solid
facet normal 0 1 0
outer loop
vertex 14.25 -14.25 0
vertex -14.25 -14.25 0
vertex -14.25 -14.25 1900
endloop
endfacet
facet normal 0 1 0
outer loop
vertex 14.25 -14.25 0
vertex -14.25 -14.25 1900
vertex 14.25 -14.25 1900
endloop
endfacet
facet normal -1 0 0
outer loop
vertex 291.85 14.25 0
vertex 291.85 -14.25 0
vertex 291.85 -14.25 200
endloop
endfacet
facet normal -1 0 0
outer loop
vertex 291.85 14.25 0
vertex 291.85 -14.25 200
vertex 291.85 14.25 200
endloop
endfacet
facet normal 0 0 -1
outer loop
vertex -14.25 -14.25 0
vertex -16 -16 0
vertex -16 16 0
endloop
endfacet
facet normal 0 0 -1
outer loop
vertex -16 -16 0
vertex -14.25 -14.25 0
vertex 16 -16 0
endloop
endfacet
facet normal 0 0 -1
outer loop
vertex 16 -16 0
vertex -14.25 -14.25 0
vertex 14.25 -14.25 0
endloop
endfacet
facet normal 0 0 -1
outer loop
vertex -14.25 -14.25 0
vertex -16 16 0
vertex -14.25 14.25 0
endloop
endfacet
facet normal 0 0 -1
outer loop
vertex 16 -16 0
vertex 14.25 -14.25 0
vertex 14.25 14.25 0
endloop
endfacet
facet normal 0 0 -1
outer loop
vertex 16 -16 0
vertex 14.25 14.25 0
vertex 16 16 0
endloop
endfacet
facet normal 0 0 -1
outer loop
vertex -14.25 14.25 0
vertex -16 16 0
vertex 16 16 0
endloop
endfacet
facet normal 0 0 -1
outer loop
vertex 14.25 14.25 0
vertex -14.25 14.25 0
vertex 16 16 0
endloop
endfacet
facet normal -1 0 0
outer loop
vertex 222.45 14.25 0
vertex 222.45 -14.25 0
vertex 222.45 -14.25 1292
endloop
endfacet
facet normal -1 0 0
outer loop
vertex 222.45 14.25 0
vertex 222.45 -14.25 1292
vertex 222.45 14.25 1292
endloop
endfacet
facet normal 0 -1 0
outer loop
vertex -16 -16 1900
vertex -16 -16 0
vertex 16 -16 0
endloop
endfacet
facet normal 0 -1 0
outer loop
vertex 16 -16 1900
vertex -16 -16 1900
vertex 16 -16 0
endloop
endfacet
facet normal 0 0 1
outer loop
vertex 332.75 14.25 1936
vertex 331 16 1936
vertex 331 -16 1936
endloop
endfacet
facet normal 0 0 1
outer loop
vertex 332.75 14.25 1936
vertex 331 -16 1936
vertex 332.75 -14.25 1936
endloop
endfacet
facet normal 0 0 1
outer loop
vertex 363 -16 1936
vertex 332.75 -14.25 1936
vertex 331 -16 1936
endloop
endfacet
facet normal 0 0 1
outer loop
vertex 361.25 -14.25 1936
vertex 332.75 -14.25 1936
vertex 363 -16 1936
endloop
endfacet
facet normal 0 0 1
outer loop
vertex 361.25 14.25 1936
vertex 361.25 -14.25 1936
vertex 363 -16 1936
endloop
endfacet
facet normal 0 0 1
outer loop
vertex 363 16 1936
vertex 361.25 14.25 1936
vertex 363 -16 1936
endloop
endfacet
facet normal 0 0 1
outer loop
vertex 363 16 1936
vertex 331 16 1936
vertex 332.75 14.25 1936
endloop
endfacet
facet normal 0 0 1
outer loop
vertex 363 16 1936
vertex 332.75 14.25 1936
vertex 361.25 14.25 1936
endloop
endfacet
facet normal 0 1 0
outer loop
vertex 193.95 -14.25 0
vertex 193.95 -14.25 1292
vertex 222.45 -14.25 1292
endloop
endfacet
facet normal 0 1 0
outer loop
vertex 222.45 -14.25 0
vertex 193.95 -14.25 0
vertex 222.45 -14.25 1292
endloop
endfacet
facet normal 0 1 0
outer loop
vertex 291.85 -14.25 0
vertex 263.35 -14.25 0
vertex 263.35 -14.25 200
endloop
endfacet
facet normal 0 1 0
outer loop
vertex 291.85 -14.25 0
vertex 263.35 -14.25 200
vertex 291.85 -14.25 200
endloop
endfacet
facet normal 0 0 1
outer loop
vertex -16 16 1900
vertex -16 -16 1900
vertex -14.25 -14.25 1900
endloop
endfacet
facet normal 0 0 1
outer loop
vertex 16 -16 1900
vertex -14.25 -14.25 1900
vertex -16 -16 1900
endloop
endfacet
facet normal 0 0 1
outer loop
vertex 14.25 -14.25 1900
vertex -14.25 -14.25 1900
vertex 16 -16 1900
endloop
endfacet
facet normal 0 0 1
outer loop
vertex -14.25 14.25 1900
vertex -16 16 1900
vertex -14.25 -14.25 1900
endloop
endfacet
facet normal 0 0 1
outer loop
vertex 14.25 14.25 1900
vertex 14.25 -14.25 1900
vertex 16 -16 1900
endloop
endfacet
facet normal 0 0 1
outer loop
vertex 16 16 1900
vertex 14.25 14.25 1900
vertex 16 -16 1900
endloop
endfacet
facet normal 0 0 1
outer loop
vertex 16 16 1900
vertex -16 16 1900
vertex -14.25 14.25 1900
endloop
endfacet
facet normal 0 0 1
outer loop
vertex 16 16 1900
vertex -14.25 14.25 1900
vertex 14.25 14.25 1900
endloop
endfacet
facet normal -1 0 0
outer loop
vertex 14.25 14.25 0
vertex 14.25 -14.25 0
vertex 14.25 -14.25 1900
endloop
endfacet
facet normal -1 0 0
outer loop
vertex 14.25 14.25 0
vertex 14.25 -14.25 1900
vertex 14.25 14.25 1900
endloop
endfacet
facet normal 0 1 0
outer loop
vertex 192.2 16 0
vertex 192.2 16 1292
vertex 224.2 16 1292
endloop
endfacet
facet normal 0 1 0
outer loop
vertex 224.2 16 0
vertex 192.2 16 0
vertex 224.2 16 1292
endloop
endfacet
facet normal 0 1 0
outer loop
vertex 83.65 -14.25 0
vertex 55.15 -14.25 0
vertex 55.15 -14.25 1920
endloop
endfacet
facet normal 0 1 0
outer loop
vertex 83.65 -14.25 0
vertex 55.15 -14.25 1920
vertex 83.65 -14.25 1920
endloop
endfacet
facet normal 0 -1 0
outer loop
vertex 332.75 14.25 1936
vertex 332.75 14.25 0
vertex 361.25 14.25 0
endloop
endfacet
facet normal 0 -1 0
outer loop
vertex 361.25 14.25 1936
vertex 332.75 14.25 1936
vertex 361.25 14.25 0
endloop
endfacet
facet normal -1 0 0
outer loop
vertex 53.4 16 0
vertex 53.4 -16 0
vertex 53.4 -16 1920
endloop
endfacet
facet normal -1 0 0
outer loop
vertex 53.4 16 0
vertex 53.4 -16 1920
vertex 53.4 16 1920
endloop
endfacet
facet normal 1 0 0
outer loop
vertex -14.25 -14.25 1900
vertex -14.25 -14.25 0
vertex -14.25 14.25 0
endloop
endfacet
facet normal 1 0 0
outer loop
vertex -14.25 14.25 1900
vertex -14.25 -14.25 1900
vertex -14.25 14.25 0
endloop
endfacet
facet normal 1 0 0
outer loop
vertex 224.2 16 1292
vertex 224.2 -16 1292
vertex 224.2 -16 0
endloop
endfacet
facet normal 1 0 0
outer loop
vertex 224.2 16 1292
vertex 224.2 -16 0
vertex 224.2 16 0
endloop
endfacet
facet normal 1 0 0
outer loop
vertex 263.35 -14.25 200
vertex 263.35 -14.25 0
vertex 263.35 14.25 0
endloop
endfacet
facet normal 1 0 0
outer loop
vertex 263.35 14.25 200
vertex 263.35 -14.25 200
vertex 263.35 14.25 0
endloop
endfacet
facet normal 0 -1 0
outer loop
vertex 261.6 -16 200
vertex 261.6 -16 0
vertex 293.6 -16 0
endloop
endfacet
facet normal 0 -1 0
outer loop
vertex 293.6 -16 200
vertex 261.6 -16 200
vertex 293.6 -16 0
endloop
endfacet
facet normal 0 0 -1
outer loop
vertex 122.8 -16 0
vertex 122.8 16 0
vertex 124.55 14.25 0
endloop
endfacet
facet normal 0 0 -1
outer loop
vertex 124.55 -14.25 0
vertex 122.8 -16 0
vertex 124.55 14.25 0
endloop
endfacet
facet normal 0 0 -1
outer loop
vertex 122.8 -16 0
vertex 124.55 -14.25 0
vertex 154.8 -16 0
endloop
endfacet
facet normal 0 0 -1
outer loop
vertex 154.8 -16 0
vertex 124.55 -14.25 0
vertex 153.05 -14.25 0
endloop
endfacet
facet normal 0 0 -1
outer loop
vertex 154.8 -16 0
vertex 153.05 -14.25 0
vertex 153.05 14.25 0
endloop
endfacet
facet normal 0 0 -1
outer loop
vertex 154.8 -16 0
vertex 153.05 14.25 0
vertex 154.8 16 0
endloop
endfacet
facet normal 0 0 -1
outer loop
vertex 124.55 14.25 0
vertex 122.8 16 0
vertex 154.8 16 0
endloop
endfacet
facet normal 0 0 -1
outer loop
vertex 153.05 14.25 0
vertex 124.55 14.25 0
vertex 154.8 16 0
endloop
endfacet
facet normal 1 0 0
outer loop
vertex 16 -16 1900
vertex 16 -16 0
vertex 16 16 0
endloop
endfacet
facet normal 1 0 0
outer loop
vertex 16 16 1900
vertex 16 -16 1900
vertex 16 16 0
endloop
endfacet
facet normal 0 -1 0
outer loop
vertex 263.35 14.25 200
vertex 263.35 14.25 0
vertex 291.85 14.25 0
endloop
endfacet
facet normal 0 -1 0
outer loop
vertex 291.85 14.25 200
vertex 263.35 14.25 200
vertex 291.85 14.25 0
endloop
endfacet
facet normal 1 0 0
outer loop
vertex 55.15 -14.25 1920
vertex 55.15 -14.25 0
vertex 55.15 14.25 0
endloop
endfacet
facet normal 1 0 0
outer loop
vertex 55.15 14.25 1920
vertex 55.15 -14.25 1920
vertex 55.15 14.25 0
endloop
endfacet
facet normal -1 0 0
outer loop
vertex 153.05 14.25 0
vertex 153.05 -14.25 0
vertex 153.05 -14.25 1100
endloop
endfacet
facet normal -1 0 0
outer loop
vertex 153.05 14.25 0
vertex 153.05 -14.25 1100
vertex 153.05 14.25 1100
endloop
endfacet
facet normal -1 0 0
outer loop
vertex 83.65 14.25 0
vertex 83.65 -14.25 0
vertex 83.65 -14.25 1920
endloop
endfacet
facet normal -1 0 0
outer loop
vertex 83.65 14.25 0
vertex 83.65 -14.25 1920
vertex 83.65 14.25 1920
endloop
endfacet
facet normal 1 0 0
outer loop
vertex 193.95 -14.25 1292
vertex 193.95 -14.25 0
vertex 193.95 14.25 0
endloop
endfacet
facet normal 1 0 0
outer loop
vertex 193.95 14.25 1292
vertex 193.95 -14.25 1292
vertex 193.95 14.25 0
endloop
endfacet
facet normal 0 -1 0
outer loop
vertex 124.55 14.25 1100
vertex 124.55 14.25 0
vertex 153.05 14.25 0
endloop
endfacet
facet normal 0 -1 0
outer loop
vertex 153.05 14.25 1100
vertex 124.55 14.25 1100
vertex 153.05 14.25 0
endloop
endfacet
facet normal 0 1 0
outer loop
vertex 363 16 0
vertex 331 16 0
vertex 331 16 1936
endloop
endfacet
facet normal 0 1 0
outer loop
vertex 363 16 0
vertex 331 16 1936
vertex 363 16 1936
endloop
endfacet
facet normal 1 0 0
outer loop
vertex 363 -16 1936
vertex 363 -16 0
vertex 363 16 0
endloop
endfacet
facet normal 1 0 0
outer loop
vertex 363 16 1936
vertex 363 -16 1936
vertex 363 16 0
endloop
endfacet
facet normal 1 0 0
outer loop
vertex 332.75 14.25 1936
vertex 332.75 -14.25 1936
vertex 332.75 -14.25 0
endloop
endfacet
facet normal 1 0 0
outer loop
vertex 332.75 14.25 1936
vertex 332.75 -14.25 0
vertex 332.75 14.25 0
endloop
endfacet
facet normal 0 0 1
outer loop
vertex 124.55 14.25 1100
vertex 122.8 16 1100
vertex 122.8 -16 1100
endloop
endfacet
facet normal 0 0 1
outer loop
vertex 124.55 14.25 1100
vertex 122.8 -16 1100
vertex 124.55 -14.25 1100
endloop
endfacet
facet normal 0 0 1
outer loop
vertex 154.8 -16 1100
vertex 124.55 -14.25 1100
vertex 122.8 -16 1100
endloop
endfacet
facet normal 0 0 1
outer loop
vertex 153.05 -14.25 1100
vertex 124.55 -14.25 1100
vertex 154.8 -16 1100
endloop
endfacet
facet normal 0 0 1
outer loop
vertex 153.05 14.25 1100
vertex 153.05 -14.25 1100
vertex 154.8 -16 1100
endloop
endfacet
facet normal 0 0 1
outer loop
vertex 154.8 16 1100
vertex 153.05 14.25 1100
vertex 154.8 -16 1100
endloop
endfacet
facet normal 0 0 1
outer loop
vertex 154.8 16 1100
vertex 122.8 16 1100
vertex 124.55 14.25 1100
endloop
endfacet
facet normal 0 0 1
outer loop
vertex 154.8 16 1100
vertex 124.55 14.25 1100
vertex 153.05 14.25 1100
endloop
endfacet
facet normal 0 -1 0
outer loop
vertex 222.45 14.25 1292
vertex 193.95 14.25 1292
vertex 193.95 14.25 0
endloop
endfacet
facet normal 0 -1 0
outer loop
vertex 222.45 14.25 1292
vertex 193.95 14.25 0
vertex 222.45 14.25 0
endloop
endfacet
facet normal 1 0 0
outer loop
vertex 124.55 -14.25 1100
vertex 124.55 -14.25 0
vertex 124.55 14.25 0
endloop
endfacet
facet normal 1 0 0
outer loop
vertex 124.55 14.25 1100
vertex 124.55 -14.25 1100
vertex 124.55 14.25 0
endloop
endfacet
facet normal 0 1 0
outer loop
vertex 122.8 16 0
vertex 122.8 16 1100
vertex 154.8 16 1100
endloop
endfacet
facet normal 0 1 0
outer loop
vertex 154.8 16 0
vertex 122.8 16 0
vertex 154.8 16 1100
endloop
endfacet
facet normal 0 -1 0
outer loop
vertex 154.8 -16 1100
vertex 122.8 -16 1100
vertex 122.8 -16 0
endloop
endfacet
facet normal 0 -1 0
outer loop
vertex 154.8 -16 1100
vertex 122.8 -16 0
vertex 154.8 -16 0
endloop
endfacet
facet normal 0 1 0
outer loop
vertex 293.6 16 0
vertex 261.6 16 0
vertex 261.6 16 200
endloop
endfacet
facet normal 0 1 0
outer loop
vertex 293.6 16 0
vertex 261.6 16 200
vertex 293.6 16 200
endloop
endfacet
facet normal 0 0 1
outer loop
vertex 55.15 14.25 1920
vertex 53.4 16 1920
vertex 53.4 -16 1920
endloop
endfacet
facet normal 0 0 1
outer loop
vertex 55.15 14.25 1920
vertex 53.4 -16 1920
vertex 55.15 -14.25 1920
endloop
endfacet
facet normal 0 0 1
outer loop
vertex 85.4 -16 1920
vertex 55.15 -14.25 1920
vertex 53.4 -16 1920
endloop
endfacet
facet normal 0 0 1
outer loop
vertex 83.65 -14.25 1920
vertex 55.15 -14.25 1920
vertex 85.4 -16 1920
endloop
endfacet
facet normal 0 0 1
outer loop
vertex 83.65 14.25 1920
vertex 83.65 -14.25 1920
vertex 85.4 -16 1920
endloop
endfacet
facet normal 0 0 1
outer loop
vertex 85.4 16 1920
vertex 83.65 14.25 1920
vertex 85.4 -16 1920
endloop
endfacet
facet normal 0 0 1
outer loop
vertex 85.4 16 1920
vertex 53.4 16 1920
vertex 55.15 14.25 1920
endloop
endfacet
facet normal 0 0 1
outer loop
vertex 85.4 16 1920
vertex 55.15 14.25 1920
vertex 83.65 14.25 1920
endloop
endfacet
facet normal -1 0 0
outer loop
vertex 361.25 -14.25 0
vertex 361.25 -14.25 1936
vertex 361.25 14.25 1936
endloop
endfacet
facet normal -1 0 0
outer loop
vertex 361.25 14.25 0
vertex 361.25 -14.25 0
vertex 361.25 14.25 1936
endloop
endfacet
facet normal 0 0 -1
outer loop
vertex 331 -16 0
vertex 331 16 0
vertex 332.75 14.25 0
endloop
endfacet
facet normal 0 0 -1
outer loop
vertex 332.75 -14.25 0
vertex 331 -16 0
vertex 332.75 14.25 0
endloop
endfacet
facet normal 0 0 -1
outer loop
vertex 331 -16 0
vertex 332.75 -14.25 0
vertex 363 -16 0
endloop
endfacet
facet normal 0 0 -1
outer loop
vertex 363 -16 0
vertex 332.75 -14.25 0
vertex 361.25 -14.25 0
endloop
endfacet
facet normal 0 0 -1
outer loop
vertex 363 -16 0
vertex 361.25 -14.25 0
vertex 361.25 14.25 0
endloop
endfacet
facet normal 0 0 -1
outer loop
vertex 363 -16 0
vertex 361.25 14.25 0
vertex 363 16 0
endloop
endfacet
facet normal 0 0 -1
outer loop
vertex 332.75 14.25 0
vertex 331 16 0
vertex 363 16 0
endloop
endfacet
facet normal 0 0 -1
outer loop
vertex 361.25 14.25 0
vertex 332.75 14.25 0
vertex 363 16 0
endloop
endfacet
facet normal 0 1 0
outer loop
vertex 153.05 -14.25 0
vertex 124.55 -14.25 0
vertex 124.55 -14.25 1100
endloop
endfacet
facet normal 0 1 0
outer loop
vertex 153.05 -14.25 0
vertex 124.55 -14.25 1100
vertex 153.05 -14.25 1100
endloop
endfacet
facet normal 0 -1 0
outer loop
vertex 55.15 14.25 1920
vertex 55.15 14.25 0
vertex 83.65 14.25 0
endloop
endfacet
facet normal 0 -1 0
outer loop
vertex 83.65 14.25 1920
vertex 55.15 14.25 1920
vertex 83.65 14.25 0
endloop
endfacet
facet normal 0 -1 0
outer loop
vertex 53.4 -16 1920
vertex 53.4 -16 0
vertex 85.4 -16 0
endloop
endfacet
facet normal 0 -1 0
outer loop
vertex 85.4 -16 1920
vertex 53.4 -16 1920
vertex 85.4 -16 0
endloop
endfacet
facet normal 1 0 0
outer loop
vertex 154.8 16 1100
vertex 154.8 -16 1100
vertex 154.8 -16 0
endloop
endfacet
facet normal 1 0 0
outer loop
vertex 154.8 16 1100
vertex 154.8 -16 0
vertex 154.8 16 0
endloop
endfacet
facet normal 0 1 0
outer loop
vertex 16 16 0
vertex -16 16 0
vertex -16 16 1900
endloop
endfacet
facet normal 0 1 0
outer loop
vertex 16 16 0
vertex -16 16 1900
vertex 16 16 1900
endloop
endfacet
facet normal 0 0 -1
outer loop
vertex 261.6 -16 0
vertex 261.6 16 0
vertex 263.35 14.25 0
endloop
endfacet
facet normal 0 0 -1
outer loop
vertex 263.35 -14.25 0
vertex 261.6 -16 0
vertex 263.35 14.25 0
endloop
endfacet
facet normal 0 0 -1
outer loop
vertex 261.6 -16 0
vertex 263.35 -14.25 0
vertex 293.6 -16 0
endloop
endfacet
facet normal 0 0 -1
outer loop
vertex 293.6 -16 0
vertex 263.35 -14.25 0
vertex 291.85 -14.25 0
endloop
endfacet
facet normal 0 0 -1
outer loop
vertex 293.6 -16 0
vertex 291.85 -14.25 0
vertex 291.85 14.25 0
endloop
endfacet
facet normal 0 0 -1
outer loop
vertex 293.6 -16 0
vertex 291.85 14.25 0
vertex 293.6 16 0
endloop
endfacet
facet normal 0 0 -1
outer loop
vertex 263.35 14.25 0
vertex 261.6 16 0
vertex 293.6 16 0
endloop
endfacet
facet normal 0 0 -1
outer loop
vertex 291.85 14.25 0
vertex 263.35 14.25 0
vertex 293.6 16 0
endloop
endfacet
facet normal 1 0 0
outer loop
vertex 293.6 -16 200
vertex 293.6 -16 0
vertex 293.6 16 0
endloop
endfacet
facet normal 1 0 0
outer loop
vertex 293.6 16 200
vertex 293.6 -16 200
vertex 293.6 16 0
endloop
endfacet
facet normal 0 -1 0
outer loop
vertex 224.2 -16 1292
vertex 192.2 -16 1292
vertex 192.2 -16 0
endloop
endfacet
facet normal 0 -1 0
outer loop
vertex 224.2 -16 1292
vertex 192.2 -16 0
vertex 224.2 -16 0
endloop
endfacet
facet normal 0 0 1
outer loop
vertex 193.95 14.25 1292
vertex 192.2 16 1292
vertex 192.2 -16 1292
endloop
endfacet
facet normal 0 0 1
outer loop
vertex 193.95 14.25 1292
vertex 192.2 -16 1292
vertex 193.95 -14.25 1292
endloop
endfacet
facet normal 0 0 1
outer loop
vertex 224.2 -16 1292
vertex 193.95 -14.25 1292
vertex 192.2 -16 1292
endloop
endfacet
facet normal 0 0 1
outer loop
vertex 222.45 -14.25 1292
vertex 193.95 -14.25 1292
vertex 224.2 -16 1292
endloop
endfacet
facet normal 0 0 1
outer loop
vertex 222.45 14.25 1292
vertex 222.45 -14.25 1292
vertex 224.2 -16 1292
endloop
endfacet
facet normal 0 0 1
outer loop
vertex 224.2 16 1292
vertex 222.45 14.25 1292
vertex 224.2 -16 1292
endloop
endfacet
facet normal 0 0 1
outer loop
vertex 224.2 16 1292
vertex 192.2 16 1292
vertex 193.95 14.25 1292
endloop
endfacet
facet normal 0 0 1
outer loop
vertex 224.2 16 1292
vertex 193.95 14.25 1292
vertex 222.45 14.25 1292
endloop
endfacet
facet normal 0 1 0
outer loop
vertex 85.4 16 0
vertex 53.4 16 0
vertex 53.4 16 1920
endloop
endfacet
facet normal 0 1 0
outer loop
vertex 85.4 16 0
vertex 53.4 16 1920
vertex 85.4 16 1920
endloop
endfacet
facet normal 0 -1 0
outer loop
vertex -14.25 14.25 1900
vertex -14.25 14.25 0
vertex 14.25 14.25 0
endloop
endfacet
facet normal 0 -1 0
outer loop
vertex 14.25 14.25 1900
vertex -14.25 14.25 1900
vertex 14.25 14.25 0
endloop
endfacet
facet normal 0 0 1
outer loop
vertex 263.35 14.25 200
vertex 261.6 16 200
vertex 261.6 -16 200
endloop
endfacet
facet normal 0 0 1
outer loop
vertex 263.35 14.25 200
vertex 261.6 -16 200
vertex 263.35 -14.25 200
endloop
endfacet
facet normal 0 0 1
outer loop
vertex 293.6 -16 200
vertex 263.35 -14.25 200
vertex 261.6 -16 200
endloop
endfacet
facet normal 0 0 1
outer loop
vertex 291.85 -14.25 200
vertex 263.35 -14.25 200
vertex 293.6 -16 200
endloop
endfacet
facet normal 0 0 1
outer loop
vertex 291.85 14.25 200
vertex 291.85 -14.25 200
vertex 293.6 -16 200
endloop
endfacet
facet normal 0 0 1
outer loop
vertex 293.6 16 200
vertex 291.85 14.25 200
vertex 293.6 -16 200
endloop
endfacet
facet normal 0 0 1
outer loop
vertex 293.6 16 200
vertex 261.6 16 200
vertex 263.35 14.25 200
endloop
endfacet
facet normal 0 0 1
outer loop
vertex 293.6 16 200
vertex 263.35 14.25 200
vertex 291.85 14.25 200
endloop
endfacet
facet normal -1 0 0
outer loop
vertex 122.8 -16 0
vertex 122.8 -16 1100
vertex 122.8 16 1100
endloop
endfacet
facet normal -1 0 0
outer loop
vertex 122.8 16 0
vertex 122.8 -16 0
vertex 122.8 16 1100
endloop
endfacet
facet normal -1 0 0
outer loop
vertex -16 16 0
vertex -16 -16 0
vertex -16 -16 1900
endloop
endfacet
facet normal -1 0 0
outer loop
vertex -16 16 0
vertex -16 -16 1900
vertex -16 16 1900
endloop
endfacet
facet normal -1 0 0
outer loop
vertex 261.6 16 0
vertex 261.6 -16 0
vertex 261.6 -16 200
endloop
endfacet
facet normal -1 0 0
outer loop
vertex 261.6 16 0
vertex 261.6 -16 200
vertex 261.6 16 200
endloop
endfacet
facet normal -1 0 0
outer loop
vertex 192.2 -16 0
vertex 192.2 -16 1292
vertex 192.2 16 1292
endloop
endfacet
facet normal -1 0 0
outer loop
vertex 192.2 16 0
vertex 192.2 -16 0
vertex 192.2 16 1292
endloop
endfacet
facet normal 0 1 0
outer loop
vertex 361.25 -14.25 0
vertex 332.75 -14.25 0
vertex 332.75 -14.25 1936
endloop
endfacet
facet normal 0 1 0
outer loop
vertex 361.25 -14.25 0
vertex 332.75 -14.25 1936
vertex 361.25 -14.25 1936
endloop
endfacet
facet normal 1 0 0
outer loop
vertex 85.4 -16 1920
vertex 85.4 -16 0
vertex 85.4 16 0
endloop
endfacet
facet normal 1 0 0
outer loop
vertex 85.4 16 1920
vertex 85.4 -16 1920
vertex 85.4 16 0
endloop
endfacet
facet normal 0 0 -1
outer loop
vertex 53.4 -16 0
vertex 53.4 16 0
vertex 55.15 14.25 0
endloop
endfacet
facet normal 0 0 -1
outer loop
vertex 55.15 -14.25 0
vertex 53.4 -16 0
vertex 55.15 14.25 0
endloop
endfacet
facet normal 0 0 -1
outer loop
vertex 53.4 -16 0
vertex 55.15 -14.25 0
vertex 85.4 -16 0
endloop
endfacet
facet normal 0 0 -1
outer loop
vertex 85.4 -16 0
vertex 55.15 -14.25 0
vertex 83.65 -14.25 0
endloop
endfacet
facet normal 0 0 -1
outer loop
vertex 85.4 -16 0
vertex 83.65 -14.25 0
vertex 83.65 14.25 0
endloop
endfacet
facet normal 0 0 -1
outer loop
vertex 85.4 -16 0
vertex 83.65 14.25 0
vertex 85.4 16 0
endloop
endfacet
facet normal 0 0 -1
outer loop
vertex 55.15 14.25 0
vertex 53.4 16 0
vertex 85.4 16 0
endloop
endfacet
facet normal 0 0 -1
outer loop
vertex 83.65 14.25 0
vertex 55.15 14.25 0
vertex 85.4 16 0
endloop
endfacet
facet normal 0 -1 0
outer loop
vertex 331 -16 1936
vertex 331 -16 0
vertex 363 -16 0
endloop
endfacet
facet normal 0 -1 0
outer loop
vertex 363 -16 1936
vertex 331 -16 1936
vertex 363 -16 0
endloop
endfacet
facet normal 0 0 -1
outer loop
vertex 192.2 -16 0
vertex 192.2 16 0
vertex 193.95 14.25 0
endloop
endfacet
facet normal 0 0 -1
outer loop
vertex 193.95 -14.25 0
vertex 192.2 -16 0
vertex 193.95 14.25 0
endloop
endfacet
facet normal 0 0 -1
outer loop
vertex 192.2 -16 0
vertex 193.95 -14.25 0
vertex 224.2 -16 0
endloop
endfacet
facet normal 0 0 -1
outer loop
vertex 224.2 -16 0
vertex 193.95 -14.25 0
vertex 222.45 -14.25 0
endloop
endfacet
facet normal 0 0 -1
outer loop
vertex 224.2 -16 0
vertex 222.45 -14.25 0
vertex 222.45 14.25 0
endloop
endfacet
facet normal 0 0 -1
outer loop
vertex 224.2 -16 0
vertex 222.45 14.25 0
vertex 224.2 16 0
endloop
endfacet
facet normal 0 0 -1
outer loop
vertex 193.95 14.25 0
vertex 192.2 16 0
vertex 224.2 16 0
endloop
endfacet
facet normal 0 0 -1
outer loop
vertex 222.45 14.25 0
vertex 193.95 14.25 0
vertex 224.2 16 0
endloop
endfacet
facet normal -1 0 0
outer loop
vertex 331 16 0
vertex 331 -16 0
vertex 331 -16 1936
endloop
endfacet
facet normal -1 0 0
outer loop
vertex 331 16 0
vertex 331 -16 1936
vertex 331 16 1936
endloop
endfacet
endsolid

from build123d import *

# Parameters (mm, degrees)
F0_W     = 32
F0_H     = 32
F0_W_2   = 28.5
F0_H_2   = 28.5
F1_DEPTH = 1900
F2_DEPTH = 1920
F3_DEPTH = 1100
F4_DEPTH = 1292
F5_DEPTH = 200
F6_DEPTH = 1936


with BuildPart() as f1:
    # F0 (on Top) → F1 (new body)
    with BuildSketch(Plane.XY):
        Rectangle(F0_W, F0_H)
        Rectangle(F0_W_2, F0_H_2, mode=Mode.SUBTRACT)
    extrude(amount=F1_DEPTH)


with BuildPart() as f2:
    # F0 (on Top) → F2 (new body)
    with BuildSketch(Plane.XY):
        with Locations((69.4, 0)):
            Rectangle(F0_W, F0_H)
        with Locations((69.4, 0)):
            Rectangle(F0_W_2, F0_H_2, mode=Mode.SUBTRACT)
    extrude(amount=F2_DEPTH)


with BuildPart() as f3:
    # F0 (on Top) → F3 (new body)
    with BuildSketch(Plane.XY):
        with Locations((138.8, 0)):
            Rectangle(F0_W, F0_H)
        with Locations((138.8, 0)):
            Rectangle(F0_W_2, F0_H_2, mode=Mode.SUBTRACT)
    extrude(amount=F3_DEPTH)


with BuildPart() as f4:
    # F0 (on Top) → F4 (new body)
    with BuildSketch(Plane.XY):
        with Locations((208.2, 0)):
            Rectangle(F0_W, F0_H)
        with Locations((208.2, 0)):
            Rectangle(F0_W_2, F0_H_2, mode=Mode.SUBTRACT)
    extrude(amount=F4_DEPTH)


with BuildPart() as f5:
    # F0 (on Top) → F5 (new body)
    with BuildSketch(Plane.XY):
        with Locations((277.6, 0)):
            Rectangle(F0_W, F0_H)
        with Locations((277.6, 0)):
            Rectangle(F0_W_2, F0_H_2, mode=Mode.SUBTRACT)
    extrude(amount=F5_DEPTH)


with BuildPart() as f6:
    # F0 (on Top) → F6 (new body)
    with BuildSketch(Plane.XY):
        with Locations((347, 0)):
            Rectangle(F0_W, F0_H)
        with Locations((347, 0)):
            Rectangle(F0_W_2, F0_H_2, mode=Mode.SUBTRACT)
    extrude(amount=F6_DEPTH)


solid = Compound([f1.part, f2.part, f3.part, f4.part, f5.part, f6.part])
